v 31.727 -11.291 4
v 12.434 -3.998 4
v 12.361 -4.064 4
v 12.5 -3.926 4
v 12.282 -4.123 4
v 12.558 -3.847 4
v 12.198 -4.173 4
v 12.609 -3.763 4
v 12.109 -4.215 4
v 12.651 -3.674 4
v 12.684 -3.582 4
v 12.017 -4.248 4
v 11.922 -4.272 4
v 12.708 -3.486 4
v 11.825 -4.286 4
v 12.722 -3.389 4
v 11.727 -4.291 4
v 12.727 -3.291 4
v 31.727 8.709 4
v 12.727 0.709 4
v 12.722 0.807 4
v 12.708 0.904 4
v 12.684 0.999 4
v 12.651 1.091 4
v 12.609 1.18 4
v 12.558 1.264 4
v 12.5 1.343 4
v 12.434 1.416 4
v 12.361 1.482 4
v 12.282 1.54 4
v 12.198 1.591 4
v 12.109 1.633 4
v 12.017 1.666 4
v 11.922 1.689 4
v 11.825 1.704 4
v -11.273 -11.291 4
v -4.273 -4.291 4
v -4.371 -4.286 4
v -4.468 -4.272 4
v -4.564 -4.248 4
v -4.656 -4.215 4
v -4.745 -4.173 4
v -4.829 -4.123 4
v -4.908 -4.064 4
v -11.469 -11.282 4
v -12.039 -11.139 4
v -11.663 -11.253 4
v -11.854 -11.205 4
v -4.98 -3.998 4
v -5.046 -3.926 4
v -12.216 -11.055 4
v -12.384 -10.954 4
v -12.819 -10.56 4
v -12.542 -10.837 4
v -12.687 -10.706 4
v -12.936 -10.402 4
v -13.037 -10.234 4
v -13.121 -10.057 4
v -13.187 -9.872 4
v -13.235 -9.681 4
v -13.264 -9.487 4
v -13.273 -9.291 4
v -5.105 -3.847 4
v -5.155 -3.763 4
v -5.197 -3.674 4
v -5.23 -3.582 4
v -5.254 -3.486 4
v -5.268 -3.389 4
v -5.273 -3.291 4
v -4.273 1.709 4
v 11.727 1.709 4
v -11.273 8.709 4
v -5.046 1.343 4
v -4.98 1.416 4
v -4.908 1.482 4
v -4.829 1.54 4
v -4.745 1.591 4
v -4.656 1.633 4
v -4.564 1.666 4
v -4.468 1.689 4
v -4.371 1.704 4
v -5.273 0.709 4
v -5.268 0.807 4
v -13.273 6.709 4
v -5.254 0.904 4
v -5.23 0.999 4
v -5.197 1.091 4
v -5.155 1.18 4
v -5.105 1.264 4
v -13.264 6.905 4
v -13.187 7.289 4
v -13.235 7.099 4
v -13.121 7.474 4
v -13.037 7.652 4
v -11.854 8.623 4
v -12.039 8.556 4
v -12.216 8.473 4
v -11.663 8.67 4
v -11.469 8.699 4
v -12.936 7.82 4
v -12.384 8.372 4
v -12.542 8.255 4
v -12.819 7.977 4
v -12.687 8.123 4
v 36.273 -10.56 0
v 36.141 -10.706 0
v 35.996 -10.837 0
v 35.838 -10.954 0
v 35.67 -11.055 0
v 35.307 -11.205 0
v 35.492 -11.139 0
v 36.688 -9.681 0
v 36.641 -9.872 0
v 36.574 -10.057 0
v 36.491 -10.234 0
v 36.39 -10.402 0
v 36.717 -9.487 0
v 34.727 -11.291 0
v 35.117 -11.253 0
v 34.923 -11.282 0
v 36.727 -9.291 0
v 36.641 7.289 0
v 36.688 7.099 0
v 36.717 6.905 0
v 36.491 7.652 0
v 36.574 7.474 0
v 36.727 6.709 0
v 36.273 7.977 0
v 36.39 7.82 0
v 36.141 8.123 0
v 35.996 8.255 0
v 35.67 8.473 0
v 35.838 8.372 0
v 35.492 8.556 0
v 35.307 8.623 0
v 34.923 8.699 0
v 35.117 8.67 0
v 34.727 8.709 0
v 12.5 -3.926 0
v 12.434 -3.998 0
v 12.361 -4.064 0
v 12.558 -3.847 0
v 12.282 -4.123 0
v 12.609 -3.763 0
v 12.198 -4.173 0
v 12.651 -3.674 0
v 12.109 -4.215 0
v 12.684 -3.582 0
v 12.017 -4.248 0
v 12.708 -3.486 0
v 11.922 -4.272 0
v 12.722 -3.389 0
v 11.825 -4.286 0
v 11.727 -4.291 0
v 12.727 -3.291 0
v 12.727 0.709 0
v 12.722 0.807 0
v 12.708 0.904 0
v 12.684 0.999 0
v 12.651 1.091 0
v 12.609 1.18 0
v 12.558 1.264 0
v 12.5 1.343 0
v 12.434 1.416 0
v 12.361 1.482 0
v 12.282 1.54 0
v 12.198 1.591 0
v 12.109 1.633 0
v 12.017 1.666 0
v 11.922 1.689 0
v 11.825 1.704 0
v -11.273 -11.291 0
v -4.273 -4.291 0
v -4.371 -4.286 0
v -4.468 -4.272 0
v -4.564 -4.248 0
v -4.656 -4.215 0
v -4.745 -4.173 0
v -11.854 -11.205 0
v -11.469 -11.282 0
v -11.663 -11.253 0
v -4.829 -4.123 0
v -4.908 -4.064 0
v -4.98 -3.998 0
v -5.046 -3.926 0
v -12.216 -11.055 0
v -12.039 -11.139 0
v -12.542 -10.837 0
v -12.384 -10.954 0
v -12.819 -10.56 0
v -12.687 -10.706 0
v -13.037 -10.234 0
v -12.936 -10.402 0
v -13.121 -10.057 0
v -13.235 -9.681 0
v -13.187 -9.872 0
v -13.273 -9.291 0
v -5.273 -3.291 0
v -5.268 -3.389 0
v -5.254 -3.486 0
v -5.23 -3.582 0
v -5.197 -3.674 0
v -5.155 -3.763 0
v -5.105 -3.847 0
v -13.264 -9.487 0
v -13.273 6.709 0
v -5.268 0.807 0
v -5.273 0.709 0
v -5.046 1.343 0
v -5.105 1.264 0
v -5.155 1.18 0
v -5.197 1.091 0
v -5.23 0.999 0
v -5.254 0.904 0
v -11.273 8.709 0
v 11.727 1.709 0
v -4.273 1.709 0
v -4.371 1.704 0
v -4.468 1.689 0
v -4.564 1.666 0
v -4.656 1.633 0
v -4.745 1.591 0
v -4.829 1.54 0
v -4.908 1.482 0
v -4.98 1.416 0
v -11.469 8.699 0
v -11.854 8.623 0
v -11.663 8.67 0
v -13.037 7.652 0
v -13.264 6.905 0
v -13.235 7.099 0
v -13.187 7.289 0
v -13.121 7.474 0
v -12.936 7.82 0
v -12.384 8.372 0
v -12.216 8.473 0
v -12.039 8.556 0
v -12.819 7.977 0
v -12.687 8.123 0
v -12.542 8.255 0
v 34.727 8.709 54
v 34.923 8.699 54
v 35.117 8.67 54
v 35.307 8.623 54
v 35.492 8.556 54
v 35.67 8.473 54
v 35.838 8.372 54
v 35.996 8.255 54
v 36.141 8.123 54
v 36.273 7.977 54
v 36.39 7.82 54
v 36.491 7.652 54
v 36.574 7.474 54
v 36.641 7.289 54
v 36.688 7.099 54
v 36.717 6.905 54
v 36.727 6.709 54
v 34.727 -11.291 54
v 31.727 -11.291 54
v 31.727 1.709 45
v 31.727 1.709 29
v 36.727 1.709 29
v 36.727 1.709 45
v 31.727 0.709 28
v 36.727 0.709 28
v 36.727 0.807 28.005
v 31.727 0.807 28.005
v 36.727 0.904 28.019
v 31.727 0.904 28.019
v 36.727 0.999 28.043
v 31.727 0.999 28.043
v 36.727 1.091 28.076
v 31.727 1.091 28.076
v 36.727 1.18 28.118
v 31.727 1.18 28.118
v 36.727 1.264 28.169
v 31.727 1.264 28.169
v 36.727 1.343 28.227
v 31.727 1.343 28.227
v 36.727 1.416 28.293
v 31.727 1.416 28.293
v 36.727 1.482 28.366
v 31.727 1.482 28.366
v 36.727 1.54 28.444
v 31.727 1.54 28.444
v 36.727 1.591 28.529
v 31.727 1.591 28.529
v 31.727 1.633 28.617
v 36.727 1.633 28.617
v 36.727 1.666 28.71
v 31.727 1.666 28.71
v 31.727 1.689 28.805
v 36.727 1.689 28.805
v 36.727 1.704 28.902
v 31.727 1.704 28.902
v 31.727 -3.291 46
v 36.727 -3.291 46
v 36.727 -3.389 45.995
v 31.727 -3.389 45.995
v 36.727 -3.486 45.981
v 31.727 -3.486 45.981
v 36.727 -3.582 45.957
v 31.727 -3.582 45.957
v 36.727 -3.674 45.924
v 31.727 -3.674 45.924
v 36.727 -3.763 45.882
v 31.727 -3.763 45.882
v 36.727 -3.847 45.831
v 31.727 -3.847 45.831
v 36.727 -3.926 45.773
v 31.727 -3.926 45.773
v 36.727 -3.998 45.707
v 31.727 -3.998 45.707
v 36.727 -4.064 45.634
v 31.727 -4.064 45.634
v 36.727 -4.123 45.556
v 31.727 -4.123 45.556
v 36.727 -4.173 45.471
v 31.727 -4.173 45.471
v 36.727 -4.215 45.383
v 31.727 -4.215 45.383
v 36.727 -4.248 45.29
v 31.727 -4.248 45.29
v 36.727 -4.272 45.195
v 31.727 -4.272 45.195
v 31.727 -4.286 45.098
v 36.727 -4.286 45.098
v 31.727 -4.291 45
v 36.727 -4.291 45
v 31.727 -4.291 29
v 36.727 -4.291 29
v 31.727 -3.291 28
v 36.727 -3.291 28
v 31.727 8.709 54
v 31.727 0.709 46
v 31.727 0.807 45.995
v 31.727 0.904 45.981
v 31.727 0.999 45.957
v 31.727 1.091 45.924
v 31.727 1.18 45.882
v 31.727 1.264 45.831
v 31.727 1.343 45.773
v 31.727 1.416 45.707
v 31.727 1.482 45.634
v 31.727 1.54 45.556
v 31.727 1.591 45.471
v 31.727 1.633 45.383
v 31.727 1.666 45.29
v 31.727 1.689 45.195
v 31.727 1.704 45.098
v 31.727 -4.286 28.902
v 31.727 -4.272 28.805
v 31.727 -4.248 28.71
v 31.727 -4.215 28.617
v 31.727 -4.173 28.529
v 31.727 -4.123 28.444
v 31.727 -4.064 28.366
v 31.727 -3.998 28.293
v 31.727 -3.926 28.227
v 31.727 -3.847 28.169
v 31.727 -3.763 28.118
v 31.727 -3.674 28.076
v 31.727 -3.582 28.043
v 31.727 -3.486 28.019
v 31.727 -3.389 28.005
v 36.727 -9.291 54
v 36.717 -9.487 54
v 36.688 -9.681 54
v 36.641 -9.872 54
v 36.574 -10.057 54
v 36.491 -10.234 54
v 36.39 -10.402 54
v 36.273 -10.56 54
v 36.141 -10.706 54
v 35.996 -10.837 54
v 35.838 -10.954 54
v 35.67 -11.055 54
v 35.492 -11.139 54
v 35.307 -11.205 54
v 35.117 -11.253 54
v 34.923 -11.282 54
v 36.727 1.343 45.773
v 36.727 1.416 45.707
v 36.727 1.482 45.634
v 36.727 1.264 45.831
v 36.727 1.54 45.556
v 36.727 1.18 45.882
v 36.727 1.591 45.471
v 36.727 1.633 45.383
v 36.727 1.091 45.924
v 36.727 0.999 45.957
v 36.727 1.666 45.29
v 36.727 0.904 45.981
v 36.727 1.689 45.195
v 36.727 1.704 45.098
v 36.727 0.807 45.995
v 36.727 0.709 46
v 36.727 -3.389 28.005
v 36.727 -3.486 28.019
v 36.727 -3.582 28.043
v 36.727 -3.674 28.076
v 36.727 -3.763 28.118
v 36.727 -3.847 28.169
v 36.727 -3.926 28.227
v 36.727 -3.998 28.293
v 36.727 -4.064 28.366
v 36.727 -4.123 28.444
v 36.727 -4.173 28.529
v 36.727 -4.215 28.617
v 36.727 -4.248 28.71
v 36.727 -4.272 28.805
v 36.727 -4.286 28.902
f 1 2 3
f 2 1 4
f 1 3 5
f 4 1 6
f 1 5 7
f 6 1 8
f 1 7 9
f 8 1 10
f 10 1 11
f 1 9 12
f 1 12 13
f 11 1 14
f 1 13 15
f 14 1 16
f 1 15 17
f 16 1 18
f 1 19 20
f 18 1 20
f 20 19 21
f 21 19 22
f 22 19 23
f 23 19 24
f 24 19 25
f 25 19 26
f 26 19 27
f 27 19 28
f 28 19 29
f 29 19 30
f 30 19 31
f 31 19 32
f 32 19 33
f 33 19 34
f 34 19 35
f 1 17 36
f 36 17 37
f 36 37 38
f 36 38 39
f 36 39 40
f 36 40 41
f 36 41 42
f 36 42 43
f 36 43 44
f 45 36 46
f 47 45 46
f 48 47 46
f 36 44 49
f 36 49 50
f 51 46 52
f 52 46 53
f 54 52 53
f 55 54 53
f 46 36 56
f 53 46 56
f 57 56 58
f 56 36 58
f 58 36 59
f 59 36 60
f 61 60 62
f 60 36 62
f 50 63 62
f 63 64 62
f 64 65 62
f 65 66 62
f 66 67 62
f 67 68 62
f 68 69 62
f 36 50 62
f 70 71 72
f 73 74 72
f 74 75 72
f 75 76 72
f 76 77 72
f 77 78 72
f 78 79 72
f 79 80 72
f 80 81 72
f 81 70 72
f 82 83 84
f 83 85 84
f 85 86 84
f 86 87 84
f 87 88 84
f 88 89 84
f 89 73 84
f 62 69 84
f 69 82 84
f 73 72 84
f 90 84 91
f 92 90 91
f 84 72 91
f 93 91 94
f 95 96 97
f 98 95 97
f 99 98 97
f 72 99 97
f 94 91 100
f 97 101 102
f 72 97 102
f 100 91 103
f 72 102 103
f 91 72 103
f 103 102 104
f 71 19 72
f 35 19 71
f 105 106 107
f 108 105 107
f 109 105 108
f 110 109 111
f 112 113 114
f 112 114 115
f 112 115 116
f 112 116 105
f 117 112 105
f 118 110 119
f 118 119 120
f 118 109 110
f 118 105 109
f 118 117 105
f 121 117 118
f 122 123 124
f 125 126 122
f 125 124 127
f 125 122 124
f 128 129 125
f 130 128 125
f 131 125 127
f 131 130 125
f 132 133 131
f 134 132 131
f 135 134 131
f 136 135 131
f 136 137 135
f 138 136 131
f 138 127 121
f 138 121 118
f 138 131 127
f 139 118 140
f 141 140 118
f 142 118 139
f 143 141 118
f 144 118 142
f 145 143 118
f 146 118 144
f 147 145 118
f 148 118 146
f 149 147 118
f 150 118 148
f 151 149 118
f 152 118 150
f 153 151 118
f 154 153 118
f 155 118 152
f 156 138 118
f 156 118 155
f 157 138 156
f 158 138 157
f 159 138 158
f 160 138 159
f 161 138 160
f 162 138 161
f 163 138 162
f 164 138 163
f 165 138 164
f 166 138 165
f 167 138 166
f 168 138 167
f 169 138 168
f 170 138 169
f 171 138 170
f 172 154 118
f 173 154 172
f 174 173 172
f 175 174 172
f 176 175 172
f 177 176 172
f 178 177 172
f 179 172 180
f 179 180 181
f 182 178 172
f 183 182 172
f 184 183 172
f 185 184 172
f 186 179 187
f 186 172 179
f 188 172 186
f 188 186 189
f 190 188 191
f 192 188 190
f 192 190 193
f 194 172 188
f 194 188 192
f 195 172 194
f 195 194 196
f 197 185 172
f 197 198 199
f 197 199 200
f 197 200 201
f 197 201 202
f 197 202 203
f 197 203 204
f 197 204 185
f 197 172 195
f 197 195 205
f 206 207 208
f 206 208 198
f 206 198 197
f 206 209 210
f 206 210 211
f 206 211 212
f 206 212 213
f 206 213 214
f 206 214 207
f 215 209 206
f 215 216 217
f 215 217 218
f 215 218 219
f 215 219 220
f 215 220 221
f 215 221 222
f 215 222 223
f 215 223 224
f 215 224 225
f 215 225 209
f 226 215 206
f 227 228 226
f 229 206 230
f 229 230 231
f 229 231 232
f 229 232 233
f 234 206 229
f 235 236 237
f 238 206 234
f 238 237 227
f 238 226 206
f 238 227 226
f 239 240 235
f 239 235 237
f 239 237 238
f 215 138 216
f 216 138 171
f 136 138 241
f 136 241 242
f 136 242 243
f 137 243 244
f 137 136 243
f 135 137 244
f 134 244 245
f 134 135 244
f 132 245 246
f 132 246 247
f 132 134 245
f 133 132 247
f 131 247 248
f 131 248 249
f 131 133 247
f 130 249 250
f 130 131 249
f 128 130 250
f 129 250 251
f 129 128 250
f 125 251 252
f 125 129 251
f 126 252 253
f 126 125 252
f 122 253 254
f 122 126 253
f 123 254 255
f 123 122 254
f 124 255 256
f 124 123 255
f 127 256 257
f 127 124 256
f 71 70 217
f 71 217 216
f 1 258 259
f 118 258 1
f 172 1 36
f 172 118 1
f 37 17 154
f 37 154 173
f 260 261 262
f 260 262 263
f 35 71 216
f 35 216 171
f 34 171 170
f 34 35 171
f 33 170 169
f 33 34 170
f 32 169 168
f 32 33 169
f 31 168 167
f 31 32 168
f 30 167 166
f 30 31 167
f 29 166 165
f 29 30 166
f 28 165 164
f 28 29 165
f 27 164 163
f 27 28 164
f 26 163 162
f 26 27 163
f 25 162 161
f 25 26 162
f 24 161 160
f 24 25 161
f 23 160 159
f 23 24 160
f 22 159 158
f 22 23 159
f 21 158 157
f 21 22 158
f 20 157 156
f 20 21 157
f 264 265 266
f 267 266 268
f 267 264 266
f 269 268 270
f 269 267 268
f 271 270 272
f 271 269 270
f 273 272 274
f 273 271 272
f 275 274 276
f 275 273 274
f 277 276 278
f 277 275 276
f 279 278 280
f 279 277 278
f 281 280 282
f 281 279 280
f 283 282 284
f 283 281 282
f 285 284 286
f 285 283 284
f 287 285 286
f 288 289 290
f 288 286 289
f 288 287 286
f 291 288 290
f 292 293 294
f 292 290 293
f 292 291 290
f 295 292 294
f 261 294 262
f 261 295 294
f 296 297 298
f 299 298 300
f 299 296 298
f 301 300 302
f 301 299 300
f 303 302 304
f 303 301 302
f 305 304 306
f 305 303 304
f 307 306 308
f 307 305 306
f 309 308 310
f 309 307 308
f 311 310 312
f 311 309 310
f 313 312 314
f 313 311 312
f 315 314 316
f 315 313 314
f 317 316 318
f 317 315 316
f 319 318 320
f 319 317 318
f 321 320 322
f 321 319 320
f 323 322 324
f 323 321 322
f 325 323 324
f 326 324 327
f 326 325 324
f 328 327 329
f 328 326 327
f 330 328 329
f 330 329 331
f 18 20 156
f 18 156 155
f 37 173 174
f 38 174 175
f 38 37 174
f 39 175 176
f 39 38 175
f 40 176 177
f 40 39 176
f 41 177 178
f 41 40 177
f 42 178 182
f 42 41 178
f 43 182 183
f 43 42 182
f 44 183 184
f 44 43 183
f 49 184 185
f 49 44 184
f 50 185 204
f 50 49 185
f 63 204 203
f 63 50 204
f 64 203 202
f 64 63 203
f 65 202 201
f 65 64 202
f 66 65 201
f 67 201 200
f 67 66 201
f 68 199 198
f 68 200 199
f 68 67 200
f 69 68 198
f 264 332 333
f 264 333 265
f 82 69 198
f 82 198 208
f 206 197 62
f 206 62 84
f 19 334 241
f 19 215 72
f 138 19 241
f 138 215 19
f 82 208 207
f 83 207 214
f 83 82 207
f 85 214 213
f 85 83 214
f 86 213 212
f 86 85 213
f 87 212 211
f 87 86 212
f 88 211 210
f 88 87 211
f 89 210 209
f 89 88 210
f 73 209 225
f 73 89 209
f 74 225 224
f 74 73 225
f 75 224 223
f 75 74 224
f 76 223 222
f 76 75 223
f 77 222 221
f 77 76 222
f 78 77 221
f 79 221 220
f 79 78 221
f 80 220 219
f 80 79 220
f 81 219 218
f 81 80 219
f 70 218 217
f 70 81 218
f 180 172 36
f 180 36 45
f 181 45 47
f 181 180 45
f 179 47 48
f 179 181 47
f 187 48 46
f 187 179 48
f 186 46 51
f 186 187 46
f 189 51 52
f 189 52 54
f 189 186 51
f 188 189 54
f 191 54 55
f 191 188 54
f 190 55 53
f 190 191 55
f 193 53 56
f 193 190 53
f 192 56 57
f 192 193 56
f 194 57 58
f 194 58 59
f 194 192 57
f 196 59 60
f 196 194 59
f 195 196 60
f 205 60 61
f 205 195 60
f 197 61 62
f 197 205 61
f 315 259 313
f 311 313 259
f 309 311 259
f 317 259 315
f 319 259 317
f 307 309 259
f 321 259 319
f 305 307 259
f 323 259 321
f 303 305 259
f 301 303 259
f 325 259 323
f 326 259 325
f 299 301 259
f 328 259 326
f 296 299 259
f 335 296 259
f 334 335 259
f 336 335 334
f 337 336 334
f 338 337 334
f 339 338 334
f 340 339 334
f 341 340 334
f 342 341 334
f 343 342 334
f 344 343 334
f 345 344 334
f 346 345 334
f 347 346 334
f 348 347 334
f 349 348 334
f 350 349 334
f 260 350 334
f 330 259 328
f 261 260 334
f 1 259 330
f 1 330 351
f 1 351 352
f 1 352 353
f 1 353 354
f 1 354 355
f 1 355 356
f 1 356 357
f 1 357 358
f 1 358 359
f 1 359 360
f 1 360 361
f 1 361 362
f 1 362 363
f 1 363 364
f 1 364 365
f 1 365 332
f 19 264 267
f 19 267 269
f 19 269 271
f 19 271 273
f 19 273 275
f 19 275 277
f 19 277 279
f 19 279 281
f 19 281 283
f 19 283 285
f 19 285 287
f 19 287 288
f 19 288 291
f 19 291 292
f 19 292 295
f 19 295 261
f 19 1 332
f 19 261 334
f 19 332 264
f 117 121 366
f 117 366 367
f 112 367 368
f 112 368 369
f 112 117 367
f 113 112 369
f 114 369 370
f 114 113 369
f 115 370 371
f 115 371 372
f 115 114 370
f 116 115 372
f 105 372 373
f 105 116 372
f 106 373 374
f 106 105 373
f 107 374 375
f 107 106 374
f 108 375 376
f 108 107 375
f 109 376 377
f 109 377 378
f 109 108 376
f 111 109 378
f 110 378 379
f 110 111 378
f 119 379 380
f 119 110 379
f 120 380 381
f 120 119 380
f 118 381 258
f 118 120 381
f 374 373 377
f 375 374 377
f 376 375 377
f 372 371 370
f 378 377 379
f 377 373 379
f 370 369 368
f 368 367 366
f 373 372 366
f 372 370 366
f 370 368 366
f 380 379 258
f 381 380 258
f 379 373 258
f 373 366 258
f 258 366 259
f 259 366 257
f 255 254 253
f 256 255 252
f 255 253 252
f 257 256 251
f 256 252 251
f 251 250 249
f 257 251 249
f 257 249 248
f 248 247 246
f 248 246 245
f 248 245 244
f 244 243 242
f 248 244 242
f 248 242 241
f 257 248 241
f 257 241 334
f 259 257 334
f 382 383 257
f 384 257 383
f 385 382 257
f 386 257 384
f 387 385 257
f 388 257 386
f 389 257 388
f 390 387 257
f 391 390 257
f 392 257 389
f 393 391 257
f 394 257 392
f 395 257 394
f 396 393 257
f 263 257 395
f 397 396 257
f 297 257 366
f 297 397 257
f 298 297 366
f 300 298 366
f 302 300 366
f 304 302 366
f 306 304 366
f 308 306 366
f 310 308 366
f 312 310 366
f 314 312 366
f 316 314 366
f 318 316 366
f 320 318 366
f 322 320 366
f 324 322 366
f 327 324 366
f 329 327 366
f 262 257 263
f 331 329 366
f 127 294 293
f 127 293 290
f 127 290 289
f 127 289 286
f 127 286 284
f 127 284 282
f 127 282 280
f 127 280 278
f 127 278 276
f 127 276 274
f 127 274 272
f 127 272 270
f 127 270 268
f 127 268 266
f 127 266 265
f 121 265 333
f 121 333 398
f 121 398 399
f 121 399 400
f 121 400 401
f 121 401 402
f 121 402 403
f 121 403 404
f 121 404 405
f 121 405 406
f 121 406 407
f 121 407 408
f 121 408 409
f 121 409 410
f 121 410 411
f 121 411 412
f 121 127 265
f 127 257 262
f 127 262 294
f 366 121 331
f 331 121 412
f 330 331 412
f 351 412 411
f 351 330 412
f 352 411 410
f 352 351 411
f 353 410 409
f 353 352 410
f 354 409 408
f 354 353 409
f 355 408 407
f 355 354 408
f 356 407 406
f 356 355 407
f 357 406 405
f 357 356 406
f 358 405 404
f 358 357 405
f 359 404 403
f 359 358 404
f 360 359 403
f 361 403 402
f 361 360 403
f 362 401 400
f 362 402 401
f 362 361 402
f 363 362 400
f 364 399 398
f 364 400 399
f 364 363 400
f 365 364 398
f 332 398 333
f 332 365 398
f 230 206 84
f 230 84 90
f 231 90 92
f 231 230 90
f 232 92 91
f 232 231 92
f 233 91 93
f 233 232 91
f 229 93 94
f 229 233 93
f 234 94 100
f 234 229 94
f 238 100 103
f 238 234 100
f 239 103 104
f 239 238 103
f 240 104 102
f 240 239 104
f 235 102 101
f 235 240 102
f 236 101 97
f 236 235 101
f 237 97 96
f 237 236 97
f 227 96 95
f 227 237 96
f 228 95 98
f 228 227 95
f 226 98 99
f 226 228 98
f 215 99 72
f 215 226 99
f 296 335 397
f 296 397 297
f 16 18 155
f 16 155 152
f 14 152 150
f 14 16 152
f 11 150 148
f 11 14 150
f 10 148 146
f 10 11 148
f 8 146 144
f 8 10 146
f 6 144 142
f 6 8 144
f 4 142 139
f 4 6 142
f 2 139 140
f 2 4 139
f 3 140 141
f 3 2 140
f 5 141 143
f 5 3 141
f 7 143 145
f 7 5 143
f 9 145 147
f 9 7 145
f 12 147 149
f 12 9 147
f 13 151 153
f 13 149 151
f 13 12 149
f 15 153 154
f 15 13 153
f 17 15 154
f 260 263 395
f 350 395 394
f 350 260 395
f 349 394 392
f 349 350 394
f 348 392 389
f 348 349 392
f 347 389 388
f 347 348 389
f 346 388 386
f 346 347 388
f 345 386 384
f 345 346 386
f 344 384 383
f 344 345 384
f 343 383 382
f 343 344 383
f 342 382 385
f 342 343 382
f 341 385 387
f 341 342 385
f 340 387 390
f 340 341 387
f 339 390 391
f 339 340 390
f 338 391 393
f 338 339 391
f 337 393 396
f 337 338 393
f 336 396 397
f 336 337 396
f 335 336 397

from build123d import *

# Parameters (mm, degrees)
BOSS_EXTRU_1_DEPTH      = 4
BOSS_EXTRU_3_DEPTH      = 50
ENL_V_MAT_EXTRU_1_DEPTH = 50
ENL_V_MAT_EXTRU_2_DEPTH = 50


with BuildPart() as part:
    # Esquisse1 → Boss.-Extru.1 (new body)
    with BuildSketch(Plane.XY):
        with BuildLine():
            Line((-11.273273273, 8.708708709), (34.726726727, 8.708708709))
            ThreePointArc((34.726726727, 8.708708709), (36.140940289, 8.122922271), (36.726726727, 6.708708709))
            Line((36.726726727, 6.708708709), (36.726726727, -9.291291291))
            ThreePointArc((36.726726727, -9.291291291), (36.140940289, -10.705504854), (34.726726727, -11.291291291))
            Line((34.726726727, -11.291291291), (-11.273273273, -11.291291291))
            ThreePointArc((-11.273273273, -11.291291291), (-12.687486836, -10.705504854), (-13.273273273, -9.291291291))
            Line((-13.273273273, -9.291291291), (-13.273273273, 6.708708709))
            ThreePointArc((-13.273273273, 6.708708709), (-12.687486836, 8.122922271), (-11.273273273, 8.708708709))
        make_face()
    extrude(amount=BOSS_EXTRU_1_DEPTH)

    # Esquisse2 → Boss.-Extru.3 (add)
    with BuildSketch(Plane.XY.offset(4)):
        with BuildLine():
            Line((31.726726727, 8.708708709), (34.726726727, 8.708708709))
            ThreePointArc((34.726726727, 8.708708709), (36.140940289, 8.122922271), (36.726726727, 6.708708709))
            Line((36.726726727, 6.708708709), (36.726726727, -9.291291291))
            ThreePointArc((36.726726727, -9.291291291), (36.140940289, -10.705504854), (34.726726727, -11.291291291))
            Line((34.726726727, -11.291291291), (31.726726727, -11.291291291))
            Line((31.726726727, -11.291291291), (31.726726727, 8.708708709))
        make_face()
    extrude(amount=BOSS_EXTRU_3_DEPTH)

    # Esquisse3 → Enlèv. mat.-Extru.1 (cut)
    with BuildSketch(Plane.XY.offset(4)):
        with BuildLine():
            Line((-4.273273273, 1.708708709), (11.726726727, 1.708708709))
            ThreePointArc((11.726726727, 1.708708709), (12.433833508, 1.41581549), (12.726726727, 0.708708709))
            Line((12.726726727, 0.708708709), (12.726726727, -3.291291291))
            ThreePointArc((12.726726727, -3.291291291), (12.433833508, -3.998398072), (11.726726727, -4.291291291))
            Line((11.726726727, -4.291291291), (-4.273273273, -4.291291291))
            ThreePointArc((-4.273273273, -4.291291291), (-4.980380054, -3.998398072), (-5.273273273, -3.291291291))
            Line((-5.273273273, -3.291291291), (-5.273273273, 0.708708709))
            ThreePointArc((-5.273273273, 0.708708709), (-4.980380054, 1.41581549), (-4.273273273, 1.708708709))
        make_face()
    extrude(amount=-ENL_V_MAT_EXTRU_1_DEPTH, mode=Mode.SUBTRACT)

    # Esquisse4 → Enlèv. mat.-Extru.2 (cut)
    with BuildSketch(Plane.ZY.offset(-31.726726727)):
        with BuildLine():
            Line((29, 1.708708709), (45, 1.708708709))
            ThreePointArc((45, 1.708708709), (45.707106781, 1.41581549), (46, 0.708708709))
            Line((46, 0.708708709), (46, -3.291291291))
            ThreePointArc((46, -3.291291291), (45.707106781, -3.998398072), (45, -4.291291291))
            Line((45, -4.291291291), (29, -4.291291291))
            ThreePointArc((29, -4.291291291), (28.292893219, -3.998398072), (28, -3.291291291))
            Line((28, -3.291291291), (28, 0.708708709))
            ThreePointArc((28, 0.708708709), (28.292893219, 1.41581549), (29, 1.708708709))
        make_face()
    extrude(amount=-ENL_V_MAT_EXTRU_2_DEPTH, mode=Mode.SUBTRACT)


solid = part.part
